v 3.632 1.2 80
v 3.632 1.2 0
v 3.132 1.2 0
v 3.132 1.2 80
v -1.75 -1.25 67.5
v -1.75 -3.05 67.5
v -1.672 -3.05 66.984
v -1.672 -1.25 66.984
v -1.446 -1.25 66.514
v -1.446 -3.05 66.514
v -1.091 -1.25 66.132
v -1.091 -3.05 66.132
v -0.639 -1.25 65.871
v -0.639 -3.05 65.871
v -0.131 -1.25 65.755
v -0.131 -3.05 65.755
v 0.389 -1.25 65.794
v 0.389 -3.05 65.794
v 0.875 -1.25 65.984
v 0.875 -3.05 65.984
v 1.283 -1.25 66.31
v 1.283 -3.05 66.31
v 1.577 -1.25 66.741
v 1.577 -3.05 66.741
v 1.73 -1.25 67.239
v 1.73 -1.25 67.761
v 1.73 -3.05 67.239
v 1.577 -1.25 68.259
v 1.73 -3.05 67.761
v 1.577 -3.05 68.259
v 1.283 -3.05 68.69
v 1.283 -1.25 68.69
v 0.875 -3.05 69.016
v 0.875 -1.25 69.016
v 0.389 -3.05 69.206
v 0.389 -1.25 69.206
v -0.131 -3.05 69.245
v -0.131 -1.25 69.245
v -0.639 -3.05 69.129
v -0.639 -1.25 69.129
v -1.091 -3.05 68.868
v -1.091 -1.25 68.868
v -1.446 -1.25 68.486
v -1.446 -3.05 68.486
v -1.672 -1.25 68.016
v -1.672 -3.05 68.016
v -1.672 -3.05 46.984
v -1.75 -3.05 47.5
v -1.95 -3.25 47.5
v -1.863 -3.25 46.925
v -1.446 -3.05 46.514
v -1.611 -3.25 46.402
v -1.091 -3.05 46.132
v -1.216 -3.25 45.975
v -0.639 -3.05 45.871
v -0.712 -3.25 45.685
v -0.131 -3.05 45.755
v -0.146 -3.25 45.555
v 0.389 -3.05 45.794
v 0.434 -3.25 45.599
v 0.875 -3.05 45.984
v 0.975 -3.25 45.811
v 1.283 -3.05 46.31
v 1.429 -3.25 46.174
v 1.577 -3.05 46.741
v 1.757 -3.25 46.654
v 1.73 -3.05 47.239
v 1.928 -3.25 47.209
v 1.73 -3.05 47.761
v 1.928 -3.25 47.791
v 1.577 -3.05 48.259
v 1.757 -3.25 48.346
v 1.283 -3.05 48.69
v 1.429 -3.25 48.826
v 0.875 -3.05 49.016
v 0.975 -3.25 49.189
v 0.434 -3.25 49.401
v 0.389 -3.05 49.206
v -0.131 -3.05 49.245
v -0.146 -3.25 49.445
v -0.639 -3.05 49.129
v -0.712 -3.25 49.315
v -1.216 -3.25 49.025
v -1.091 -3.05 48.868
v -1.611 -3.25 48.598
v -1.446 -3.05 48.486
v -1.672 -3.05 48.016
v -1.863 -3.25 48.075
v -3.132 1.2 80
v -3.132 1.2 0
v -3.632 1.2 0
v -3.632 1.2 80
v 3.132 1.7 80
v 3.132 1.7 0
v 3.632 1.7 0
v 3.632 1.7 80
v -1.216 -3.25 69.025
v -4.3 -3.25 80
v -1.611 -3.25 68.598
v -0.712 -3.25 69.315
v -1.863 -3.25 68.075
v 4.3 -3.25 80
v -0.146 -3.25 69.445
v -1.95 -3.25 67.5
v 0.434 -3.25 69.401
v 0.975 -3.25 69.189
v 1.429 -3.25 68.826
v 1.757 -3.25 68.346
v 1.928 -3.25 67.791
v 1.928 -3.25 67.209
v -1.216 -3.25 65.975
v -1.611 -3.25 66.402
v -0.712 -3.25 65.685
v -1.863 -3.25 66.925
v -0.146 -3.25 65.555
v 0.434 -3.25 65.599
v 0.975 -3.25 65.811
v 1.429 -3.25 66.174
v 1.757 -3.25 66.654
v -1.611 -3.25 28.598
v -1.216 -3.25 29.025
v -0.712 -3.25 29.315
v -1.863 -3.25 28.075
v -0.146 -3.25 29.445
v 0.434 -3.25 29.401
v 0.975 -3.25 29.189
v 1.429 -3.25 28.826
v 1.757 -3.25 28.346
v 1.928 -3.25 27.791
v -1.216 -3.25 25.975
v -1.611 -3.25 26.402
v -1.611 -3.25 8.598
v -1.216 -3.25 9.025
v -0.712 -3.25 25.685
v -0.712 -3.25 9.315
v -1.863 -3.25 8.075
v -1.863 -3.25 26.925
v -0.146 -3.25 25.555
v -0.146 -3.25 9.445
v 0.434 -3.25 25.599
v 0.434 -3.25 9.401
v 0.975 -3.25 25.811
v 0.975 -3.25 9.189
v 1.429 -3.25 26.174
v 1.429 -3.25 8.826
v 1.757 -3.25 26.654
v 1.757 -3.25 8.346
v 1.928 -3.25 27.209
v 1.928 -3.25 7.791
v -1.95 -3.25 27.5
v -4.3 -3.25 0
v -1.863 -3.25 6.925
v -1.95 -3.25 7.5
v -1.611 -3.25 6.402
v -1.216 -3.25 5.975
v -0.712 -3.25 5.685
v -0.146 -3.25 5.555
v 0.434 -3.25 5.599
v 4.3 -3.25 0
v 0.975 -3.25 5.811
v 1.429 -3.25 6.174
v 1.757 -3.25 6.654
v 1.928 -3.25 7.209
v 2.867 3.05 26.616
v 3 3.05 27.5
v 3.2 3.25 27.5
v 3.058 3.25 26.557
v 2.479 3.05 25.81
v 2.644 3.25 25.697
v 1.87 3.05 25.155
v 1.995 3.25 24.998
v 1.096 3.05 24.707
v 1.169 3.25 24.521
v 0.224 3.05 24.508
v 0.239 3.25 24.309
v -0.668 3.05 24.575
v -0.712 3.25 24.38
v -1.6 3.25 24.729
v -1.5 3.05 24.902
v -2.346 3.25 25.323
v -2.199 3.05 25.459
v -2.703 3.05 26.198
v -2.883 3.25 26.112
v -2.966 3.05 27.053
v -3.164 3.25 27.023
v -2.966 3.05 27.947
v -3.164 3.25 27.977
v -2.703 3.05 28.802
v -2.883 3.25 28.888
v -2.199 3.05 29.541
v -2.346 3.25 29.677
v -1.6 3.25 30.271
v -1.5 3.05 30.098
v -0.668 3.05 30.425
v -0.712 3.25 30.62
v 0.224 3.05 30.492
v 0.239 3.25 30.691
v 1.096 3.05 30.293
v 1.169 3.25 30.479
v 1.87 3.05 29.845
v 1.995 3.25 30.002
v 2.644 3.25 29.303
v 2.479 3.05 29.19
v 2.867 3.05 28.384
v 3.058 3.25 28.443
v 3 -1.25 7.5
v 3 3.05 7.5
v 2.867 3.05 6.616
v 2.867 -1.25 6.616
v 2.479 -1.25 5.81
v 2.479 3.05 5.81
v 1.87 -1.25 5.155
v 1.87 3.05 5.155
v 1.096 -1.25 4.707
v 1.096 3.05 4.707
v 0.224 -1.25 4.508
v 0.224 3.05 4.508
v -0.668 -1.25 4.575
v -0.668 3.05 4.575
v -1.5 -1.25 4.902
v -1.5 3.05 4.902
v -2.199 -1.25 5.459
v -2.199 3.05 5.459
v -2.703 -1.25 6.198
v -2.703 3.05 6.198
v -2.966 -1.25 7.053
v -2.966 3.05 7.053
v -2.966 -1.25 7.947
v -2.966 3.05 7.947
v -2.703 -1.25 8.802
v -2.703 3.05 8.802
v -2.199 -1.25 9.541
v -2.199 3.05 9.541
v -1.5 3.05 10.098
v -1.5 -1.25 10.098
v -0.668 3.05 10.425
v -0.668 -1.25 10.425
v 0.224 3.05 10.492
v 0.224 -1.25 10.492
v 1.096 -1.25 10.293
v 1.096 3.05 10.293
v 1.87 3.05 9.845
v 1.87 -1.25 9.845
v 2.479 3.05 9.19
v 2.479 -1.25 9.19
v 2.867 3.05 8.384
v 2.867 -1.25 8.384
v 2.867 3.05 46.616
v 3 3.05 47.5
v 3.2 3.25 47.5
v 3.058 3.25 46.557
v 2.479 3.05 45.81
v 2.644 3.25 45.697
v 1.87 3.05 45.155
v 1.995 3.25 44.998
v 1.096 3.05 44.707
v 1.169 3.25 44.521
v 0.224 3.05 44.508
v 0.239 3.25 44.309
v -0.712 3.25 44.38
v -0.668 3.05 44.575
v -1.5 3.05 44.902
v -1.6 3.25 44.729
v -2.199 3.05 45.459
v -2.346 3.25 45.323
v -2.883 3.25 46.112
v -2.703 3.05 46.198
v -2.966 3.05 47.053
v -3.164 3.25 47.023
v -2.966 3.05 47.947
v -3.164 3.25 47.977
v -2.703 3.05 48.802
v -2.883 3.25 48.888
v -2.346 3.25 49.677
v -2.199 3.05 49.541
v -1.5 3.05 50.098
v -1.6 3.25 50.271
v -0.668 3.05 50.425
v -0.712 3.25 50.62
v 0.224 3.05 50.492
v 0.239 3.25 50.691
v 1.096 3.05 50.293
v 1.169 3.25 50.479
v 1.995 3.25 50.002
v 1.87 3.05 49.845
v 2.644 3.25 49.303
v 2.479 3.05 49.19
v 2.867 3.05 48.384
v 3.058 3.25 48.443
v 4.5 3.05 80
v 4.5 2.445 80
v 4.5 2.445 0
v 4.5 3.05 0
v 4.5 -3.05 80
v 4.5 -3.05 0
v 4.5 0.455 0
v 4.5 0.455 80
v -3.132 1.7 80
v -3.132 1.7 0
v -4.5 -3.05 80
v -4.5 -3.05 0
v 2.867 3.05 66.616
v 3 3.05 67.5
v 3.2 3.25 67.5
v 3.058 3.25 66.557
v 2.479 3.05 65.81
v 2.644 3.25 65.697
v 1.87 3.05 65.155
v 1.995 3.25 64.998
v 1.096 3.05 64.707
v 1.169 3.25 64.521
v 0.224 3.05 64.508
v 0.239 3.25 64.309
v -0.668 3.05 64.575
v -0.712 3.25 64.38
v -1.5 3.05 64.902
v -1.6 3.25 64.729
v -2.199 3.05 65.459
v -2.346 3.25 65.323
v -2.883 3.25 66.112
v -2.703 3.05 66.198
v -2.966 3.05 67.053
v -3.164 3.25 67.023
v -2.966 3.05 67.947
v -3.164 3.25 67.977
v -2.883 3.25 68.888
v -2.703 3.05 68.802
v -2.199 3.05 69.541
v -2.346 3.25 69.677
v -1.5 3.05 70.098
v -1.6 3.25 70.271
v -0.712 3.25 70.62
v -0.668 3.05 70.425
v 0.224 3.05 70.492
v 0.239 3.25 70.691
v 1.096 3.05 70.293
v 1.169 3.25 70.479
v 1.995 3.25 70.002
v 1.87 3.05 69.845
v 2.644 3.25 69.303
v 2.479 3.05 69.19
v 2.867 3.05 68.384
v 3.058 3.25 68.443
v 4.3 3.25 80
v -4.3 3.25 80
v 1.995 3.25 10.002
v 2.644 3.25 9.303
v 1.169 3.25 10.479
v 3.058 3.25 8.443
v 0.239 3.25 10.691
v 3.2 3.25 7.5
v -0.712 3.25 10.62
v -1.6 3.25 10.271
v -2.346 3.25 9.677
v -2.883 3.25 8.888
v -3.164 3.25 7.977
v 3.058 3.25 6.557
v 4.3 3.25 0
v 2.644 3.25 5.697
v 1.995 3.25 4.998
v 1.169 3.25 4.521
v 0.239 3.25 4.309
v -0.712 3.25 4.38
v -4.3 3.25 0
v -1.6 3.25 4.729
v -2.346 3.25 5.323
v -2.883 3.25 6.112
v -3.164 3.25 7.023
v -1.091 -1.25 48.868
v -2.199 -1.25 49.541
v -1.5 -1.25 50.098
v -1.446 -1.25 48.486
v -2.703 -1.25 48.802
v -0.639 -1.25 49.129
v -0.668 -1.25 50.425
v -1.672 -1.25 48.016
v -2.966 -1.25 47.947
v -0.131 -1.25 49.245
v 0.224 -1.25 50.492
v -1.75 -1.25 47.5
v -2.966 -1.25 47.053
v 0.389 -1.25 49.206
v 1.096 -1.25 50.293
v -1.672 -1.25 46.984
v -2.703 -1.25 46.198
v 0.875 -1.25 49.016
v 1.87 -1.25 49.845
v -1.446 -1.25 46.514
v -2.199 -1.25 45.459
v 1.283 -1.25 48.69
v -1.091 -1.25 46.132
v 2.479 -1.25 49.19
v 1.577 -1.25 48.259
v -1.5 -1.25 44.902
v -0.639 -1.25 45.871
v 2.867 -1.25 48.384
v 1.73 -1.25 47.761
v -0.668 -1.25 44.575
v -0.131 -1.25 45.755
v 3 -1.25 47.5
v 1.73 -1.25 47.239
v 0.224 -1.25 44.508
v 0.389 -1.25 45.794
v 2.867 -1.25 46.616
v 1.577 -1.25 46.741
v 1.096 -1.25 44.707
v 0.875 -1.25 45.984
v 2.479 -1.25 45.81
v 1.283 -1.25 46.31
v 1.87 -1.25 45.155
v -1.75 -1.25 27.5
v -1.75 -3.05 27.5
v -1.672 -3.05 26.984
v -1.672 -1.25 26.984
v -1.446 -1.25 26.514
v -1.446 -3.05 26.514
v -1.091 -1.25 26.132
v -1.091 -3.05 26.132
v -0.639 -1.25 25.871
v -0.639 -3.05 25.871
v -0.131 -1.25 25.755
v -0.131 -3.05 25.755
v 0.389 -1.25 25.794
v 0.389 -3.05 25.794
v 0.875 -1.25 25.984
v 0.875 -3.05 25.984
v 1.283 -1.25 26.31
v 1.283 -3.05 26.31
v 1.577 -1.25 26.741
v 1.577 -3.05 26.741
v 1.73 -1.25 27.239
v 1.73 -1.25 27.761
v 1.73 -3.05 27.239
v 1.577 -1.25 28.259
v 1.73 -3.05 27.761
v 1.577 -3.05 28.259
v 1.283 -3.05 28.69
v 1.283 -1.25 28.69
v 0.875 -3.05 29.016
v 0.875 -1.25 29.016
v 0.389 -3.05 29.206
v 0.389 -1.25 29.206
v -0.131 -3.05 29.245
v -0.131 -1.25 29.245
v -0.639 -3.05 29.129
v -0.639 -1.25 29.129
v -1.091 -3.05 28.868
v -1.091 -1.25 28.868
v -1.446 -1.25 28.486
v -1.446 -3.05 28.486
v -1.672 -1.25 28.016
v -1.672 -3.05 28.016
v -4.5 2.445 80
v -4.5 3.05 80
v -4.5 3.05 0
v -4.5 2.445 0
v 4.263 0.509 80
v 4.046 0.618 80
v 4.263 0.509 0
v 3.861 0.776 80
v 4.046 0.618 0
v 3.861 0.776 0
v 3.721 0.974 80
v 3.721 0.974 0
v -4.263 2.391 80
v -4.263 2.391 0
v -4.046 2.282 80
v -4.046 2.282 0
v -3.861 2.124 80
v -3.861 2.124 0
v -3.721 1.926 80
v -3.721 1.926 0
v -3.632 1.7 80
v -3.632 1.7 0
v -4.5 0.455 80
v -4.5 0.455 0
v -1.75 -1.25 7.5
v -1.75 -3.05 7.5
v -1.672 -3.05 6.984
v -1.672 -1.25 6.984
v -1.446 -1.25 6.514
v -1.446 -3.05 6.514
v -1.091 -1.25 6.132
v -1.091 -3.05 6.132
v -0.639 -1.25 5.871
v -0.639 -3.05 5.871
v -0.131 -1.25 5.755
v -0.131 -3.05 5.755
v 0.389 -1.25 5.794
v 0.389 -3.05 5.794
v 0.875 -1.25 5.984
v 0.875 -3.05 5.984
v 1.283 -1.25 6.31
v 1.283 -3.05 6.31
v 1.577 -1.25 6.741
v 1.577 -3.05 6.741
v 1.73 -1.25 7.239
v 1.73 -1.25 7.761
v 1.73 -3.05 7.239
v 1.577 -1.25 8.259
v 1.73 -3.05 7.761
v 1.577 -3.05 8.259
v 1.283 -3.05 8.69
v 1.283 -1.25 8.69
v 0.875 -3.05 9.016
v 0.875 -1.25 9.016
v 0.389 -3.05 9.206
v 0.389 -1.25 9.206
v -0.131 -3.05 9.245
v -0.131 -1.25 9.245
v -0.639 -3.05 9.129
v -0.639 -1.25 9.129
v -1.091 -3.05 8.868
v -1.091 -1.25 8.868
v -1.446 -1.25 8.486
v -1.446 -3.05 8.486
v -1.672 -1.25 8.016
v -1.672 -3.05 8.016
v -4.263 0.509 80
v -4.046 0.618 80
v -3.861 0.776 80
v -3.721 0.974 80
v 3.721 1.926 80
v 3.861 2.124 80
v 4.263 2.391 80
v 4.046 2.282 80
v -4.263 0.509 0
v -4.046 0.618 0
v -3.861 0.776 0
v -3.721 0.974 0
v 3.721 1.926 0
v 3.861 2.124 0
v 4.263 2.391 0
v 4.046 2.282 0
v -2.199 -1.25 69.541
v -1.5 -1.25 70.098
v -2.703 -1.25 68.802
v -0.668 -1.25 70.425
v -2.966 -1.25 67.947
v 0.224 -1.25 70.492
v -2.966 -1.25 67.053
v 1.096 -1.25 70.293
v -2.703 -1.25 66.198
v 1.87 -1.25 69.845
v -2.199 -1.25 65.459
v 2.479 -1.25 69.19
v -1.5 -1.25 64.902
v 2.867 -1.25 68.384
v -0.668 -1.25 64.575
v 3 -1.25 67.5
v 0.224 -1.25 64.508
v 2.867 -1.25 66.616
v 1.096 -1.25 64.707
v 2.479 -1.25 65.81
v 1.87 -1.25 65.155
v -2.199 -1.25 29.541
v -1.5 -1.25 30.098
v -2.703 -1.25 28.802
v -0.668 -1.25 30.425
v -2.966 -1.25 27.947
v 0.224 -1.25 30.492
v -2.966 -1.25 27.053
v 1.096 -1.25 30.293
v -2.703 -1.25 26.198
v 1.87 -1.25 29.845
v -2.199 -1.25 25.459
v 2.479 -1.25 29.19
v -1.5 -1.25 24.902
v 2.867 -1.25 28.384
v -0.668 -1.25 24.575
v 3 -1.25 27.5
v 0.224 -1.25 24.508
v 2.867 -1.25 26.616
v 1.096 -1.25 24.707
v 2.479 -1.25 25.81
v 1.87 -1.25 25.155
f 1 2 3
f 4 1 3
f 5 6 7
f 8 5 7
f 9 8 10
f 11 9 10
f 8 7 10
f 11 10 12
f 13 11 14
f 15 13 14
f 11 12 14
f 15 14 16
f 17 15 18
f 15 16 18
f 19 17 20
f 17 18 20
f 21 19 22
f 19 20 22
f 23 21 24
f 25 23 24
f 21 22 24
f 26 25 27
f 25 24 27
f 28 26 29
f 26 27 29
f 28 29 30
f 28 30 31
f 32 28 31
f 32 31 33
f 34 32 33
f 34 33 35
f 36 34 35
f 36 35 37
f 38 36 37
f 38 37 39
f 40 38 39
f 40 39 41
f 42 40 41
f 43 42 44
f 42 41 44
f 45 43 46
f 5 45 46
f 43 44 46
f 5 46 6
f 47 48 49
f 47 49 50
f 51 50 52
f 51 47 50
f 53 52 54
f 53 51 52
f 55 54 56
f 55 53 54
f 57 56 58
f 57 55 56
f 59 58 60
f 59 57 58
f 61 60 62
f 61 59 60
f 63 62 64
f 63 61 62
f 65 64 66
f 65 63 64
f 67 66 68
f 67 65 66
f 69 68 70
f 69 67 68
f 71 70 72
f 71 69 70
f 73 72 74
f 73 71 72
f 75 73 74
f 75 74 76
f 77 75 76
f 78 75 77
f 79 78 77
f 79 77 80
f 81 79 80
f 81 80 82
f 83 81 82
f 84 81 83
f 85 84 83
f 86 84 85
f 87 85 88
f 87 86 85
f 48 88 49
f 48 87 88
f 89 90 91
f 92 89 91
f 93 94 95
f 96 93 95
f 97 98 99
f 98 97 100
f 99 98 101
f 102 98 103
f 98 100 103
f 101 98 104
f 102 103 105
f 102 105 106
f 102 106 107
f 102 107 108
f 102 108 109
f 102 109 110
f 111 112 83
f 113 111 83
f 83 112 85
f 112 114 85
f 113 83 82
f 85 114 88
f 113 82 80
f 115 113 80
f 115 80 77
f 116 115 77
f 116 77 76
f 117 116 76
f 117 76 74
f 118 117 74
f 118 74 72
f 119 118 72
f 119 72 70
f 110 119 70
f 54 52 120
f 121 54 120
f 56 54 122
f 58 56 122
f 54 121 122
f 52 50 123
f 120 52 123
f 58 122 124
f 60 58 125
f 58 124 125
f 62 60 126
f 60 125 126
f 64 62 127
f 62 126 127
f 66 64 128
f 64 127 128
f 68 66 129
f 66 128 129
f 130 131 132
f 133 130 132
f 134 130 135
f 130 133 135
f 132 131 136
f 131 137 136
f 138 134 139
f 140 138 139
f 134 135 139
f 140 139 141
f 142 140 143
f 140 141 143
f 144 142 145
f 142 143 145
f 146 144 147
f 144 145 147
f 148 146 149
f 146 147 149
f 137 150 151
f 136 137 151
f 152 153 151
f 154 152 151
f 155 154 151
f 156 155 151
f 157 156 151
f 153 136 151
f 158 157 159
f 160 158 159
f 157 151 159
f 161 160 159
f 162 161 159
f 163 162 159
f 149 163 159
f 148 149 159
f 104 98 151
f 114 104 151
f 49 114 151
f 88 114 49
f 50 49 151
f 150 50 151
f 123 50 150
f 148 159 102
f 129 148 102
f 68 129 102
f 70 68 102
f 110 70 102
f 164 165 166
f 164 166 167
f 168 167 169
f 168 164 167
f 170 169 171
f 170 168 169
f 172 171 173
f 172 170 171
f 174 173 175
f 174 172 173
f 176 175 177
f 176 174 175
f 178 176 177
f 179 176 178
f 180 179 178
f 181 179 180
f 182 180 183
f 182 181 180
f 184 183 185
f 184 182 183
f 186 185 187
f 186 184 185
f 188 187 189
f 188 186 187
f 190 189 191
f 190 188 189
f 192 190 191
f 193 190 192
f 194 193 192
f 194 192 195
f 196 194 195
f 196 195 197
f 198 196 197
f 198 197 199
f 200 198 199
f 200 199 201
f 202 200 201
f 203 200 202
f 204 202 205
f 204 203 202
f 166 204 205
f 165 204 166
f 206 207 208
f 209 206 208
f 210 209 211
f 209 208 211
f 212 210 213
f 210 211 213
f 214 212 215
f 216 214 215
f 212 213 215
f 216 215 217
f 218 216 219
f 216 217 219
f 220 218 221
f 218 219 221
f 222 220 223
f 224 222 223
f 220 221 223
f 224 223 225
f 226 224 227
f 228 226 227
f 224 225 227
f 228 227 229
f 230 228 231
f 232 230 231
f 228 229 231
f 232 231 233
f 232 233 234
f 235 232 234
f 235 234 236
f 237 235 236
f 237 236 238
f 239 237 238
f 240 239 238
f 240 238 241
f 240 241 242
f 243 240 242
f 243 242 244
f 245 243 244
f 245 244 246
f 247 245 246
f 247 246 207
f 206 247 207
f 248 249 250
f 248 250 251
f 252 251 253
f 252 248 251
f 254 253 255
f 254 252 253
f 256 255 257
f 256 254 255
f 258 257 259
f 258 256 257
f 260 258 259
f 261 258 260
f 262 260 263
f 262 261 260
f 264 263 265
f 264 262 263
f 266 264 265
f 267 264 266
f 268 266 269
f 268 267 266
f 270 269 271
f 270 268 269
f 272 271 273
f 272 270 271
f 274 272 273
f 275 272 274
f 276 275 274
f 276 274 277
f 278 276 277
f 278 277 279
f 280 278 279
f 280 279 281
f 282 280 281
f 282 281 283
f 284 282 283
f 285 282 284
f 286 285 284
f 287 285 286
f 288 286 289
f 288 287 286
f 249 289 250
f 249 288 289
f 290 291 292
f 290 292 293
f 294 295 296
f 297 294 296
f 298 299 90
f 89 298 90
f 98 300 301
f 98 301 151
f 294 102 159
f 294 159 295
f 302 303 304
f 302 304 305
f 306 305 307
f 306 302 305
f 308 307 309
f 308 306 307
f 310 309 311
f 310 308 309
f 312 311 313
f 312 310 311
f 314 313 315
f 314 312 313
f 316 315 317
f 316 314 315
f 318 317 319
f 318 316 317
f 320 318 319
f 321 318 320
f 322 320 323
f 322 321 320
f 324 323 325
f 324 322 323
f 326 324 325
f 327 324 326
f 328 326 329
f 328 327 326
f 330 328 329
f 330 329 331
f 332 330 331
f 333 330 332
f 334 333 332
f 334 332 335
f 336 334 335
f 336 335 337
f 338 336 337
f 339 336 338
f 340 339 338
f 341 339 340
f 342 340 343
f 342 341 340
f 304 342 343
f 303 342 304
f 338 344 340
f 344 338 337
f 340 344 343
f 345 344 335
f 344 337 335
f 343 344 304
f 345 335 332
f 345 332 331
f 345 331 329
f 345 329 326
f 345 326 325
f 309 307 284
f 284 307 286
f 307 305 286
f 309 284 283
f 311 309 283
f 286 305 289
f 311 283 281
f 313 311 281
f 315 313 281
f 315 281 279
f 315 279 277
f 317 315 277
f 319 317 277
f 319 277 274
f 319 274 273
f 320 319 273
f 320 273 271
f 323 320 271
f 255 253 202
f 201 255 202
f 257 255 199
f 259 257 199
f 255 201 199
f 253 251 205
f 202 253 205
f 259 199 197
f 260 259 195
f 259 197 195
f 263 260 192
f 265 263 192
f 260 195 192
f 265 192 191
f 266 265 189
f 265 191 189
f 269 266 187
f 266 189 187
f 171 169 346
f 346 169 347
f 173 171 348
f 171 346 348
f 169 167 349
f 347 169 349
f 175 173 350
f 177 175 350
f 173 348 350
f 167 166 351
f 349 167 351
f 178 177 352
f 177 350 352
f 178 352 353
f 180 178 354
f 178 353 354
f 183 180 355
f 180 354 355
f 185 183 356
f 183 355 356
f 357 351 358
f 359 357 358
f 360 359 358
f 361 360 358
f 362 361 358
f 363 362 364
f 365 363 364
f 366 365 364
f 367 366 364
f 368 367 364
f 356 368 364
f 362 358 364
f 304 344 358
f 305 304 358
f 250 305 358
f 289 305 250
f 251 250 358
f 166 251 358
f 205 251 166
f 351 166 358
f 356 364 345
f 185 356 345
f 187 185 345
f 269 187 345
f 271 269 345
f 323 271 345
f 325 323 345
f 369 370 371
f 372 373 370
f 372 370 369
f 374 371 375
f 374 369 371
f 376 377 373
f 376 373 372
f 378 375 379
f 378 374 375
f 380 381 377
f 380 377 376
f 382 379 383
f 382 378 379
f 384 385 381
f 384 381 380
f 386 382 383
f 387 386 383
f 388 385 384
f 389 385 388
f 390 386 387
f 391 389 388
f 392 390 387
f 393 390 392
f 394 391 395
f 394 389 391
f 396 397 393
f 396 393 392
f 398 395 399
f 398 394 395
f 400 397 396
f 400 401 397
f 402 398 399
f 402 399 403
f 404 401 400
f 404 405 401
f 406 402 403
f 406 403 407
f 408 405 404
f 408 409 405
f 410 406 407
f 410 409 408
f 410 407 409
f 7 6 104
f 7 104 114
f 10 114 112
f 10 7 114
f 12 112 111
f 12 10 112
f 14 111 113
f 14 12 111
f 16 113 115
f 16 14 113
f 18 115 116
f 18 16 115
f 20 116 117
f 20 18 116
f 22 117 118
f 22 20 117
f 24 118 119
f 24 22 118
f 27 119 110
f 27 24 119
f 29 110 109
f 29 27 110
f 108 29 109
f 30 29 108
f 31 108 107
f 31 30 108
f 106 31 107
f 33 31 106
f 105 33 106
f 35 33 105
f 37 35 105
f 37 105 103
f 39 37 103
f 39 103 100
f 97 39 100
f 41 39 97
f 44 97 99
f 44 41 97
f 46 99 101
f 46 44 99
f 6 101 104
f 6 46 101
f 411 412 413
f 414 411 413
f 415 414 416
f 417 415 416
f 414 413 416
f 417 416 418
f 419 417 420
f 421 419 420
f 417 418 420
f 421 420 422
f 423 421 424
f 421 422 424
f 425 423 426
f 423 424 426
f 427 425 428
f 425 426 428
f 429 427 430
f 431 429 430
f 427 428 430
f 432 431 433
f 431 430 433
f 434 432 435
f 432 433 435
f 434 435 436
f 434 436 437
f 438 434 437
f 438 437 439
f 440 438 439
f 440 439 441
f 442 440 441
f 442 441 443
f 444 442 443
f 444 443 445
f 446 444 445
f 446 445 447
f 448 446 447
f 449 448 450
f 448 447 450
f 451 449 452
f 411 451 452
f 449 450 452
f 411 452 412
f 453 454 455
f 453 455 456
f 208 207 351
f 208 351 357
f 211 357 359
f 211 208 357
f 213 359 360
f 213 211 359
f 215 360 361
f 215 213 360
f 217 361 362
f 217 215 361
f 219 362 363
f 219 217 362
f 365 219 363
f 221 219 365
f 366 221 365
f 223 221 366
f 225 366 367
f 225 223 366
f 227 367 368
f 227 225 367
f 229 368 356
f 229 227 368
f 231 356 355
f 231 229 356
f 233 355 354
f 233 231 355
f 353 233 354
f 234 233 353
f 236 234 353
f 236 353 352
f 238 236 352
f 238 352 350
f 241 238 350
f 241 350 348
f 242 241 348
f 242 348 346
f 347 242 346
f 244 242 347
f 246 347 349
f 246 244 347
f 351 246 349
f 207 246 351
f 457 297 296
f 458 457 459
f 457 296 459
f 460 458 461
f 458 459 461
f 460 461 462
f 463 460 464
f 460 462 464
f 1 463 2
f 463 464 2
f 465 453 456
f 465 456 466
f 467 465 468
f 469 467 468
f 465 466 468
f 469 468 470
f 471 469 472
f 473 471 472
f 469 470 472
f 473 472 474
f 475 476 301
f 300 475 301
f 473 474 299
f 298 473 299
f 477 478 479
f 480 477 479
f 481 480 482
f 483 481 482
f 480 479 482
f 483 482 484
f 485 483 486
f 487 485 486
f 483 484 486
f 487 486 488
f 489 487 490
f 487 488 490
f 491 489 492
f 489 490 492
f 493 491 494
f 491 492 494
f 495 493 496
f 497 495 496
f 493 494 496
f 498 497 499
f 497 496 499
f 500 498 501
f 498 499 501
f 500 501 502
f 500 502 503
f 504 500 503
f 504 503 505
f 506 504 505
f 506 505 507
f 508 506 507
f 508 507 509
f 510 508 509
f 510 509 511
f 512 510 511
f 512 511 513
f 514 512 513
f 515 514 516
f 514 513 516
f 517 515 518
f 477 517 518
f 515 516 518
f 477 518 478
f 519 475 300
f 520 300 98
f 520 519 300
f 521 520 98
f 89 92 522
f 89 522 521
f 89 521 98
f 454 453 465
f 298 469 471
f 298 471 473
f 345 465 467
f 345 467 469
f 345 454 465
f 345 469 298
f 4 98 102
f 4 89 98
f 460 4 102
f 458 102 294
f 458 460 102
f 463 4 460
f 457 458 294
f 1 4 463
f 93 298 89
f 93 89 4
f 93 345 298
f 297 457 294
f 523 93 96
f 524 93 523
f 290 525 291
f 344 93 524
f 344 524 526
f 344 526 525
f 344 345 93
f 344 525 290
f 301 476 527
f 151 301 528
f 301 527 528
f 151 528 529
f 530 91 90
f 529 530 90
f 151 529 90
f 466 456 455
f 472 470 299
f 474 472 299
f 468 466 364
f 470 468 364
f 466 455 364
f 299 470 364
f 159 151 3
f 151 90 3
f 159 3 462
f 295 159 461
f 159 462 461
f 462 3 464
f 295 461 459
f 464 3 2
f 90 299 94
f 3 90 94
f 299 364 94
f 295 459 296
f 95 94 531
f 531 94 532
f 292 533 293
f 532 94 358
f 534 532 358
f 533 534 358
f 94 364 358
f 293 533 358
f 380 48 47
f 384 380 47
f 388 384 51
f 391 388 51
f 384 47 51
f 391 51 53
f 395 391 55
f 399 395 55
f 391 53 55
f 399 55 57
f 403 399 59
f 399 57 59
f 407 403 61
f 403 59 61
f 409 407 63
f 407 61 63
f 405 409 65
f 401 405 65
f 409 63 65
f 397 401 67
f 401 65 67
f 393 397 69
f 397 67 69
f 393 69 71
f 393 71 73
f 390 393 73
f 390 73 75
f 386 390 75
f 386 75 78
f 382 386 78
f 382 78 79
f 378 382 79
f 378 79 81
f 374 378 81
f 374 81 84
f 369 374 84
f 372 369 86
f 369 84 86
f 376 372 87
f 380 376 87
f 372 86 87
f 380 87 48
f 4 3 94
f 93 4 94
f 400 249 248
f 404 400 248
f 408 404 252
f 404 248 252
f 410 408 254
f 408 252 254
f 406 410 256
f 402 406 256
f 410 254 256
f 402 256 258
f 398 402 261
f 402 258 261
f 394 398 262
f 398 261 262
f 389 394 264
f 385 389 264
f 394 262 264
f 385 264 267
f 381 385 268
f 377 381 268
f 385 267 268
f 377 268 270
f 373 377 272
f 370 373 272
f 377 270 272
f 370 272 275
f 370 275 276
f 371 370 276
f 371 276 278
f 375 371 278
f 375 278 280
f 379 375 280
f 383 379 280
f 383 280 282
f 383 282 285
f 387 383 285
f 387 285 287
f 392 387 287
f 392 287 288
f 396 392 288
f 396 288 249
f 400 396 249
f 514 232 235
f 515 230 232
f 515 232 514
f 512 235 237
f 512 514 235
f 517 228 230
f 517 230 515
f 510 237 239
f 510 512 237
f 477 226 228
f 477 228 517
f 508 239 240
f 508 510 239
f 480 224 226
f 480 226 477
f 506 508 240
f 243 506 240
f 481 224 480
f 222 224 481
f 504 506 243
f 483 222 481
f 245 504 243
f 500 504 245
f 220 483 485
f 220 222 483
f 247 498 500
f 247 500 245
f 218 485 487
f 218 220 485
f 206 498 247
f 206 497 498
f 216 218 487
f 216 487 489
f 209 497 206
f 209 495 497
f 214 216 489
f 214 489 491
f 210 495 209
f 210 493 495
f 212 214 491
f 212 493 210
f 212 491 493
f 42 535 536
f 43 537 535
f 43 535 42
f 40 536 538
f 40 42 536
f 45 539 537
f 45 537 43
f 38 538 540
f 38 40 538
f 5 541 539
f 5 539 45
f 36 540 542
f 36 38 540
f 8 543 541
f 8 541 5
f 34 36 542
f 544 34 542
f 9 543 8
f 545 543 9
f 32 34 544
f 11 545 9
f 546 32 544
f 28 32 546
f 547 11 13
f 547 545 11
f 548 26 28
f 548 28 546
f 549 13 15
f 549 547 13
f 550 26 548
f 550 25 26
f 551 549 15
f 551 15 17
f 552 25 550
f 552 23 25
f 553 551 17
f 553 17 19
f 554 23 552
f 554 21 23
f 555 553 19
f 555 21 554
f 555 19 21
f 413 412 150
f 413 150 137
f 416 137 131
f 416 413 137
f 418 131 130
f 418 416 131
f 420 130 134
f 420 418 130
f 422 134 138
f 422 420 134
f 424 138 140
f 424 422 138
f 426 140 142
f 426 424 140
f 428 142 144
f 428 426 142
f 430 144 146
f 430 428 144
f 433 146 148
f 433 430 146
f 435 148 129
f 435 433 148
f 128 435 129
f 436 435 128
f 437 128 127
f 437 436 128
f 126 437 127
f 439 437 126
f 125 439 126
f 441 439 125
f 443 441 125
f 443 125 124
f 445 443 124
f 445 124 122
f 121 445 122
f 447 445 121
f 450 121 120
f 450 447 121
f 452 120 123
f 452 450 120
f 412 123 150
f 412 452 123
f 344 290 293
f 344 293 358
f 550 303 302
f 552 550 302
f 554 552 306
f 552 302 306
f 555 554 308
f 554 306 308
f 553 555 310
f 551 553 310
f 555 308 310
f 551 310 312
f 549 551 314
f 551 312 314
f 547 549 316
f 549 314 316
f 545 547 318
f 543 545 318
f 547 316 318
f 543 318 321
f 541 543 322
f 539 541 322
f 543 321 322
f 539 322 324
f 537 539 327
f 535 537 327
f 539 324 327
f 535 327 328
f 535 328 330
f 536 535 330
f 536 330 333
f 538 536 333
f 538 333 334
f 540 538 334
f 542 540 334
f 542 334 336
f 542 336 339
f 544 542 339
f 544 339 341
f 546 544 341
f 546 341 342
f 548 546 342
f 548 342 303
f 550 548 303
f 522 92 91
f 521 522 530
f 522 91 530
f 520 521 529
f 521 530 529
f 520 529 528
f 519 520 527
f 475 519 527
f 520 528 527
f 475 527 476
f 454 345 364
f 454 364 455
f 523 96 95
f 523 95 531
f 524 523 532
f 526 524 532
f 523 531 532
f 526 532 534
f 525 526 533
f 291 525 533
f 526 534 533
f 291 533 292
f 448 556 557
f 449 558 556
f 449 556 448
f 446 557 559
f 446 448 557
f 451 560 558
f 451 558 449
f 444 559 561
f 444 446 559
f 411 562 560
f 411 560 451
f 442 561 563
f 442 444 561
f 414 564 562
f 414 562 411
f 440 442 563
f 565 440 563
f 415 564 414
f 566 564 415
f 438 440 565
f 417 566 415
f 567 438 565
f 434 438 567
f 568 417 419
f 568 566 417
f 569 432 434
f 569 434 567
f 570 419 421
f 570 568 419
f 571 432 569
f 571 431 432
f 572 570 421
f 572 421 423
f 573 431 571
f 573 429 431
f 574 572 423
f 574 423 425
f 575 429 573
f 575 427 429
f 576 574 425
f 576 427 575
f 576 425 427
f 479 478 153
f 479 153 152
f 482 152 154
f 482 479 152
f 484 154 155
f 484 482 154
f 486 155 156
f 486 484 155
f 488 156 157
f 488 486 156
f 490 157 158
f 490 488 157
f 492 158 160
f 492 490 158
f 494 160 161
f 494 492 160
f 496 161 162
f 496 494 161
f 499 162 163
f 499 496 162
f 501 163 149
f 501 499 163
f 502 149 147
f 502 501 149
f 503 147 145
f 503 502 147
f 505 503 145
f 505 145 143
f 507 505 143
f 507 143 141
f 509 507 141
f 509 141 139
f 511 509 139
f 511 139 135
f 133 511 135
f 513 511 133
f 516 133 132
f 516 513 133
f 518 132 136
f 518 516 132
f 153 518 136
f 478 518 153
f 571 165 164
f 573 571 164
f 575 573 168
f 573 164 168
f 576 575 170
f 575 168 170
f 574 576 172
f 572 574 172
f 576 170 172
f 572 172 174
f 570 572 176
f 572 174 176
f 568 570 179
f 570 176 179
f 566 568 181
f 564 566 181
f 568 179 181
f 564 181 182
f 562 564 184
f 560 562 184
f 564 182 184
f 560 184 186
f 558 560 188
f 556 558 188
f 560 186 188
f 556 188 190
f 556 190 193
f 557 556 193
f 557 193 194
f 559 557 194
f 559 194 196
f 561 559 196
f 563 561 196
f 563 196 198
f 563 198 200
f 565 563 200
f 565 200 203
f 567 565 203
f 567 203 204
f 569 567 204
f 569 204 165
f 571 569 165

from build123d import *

# Parameters (mm, degrees)
EXTRUDE1_DEPTH                     = 80
HOLE_WIZARD_M3_1_D                 = 3.5
HOLE_WIZARD_M3_1_CBORE_D           = 6
HOLE_WIZARD_M3_1_CBORE_DEPTH       = 4.5
CHAMFER_1_SIZE                     = 0.2
PATTERN_LINEAR_1_COUNT             = 4
PATTERN_LINEAR_1_PITCH             = 20
CHAMFER_1_OF_PATTERN_LINEAR_1_SIZE = 0.2


with BuildPart() as part:
    # Sketch1 → Extrude1 (new body)
    with BuildSketch(Plane.XY):
        with BuildLine():
            Line((-4.3, -3.25), (4.3, -3.25))
            Line((4.3, -3.25), (4.5, -3.05))
            Line((4.5, -3.05), (4.5, 0.455012563))
            ThreePointArc((4.5, 0.455012563), (3.948817336, 0.691078965), (3.631754163, 1.2))
            Line((3.631754163, 1.2), (3.131754163, 1.2))
            Line((3.131754163, 1.2), (3.131754163, 1.7))
            Line((3.131754163, 1.7), (3.631754163, 1.7))
            ThreePointArc((3.631754163, 1.7), (3.948817336, 2.208921035), (4.5, 2.444987437))
            Line((4.5, 2.444987437), (4.5, 3.05))
            Line((4.5, 3.05), (4.3, 3.25))
            Line((4.3, 3.25), (-4.3, 3.25))
            Line((-4.3, 3.25), (-4.5, 3.05))
            Line((-4.5, 3.05), (-4.5, 2.444987437))
            ThreePointArc((-4.5, 2.444987437), (-3.948817336, 2.208921035), (-3.631754163, 1.7))
            Line((-3.631754163, 1.7), (-3.131754163, 1.7))
            Line((-3.131754163, 1.7), (-3.131754163, 1.2))
            Line((-3.131754163, 1.2), (-3.631754163, 1.2))
            ThreePointArc((-3.631754163, 1.2), (-3.948817336, 0.691078965), (-4.5, 0.455012563))
            Line((-4.5, 0.455012563), (-4.5, -3.05))
            Line((-4.5, -3.05), (-4.3, -3.25))
        make_face()
    extrude(amount=EXTRUDE1_DEPTH)

    # M3 平盤頭機械螺釘的柱孔1 (through all)
    with Locations(Plane(origin=(0, 3.25, 0), x_dir=(1, 0, 0), z_dir=(0, 1, 0))):
        with Locations((0, -7.5)):
            hole_wizard_m3_1 = CounterBoreHole(HOLE_WIZARD_M3_1_D / 2, HOLE_WIZARD_M3_1_CBORE_D / 2, HOLE_WIZARD_M3_1_CBORE_DEPTH)

    # 導角1
    chamfer_1_edges = [part.edges().sort_by_distance(p)[0] for p in [
        (-3, 3.25, 7.5),
        (1.75, -3.25, 7.5),
    ]]
    chamfer(chamfer_1_edges, length=CHAMFER_1_SIZE)

    # 直線複製排列1: M3 平盤頭機械螺釘的柱孔1 ×4
    with Locations(*[(0, 0, i * PATTERN_LINEAR_1_PITCH) for i in range(1, PATTERN_LINEAR_1_COUNT)]):
        add(hole_wizard_m3_1, mode=Mode.SUBTRACT)

    # 導角1 of 直線複製排列1
    chamfer_1_of_pattern_linear_1_edges = [part.edges().sort_by_distance(p)[0] for p in [
        (-3, 3.25, 27.5),
        (1.75, -3.25, 27.5),
        (-3, 3.25, 47.5),
        (1.75, -3.25, 47.5),
        (-3, 3.25, 67.5),
        (1.75, -3.25, 67.5),
    ]]
    chamfer(chamfer_1_of_pattern_linear_1_edges, length=CHAMFER_1_OF_PATTERN_LINEAR_1_SIZE)


solid = part.part
